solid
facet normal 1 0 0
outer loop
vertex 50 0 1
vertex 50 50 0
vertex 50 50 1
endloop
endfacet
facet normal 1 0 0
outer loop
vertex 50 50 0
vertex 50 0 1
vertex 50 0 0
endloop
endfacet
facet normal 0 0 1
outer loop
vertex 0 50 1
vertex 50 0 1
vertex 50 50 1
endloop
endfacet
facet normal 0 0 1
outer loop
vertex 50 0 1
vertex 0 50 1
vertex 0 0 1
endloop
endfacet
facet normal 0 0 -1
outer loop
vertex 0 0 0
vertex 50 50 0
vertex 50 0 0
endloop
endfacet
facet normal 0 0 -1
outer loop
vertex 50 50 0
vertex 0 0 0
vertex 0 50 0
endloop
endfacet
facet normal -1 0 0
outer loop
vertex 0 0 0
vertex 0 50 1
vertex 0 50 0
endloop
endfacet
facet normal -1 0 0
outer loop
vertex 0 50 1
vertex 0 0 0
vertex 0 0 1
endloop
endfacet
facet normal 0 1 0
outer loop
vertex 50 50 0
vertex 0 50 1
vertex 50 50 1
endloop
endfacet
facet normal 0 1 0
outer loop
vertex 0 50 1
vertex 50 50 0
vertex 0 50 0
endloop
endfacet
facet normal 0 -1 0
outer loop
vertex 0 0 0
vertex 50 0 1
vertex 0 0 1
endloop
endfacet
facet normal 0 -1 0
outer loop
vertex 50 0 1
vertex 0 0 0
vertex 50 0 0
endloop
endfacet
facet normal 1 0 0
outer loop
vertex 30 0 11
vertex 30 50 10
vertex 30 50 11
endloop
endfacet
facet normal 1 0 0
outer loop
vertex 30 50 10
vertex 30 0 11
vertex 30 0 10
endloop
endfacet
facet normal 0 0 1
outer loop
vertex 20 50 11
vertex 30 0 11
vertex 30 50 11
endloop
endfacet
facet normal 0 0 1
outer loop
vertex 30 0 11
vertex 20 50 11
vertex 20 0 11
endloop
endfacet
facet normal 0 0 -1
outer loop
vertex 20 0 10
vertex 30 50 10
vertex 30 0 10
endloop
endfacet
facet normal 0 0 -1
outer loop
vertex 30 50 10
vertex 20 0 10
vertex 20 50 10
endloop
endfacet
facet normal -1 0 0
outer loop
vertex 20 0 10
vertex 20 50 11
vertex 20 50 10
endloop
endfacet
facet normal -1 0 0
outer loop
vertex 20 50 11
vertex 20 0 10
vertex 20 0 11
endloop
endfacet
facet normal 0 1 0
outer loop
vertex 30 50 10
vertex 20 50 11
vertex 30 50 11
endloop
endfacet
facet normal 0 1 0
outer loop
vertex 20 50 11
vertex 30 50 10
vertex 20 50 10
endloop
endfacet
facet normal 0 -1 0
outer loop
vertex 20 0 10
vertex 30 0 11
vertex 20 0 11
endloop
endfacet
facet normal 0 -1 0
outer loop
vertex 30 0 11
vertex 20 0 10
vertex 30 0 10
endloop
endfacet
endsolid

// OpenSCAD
cube([50, 50, 1]);
translate([20, 0, 10]) {
	cube([10, 50, 1]);
}
